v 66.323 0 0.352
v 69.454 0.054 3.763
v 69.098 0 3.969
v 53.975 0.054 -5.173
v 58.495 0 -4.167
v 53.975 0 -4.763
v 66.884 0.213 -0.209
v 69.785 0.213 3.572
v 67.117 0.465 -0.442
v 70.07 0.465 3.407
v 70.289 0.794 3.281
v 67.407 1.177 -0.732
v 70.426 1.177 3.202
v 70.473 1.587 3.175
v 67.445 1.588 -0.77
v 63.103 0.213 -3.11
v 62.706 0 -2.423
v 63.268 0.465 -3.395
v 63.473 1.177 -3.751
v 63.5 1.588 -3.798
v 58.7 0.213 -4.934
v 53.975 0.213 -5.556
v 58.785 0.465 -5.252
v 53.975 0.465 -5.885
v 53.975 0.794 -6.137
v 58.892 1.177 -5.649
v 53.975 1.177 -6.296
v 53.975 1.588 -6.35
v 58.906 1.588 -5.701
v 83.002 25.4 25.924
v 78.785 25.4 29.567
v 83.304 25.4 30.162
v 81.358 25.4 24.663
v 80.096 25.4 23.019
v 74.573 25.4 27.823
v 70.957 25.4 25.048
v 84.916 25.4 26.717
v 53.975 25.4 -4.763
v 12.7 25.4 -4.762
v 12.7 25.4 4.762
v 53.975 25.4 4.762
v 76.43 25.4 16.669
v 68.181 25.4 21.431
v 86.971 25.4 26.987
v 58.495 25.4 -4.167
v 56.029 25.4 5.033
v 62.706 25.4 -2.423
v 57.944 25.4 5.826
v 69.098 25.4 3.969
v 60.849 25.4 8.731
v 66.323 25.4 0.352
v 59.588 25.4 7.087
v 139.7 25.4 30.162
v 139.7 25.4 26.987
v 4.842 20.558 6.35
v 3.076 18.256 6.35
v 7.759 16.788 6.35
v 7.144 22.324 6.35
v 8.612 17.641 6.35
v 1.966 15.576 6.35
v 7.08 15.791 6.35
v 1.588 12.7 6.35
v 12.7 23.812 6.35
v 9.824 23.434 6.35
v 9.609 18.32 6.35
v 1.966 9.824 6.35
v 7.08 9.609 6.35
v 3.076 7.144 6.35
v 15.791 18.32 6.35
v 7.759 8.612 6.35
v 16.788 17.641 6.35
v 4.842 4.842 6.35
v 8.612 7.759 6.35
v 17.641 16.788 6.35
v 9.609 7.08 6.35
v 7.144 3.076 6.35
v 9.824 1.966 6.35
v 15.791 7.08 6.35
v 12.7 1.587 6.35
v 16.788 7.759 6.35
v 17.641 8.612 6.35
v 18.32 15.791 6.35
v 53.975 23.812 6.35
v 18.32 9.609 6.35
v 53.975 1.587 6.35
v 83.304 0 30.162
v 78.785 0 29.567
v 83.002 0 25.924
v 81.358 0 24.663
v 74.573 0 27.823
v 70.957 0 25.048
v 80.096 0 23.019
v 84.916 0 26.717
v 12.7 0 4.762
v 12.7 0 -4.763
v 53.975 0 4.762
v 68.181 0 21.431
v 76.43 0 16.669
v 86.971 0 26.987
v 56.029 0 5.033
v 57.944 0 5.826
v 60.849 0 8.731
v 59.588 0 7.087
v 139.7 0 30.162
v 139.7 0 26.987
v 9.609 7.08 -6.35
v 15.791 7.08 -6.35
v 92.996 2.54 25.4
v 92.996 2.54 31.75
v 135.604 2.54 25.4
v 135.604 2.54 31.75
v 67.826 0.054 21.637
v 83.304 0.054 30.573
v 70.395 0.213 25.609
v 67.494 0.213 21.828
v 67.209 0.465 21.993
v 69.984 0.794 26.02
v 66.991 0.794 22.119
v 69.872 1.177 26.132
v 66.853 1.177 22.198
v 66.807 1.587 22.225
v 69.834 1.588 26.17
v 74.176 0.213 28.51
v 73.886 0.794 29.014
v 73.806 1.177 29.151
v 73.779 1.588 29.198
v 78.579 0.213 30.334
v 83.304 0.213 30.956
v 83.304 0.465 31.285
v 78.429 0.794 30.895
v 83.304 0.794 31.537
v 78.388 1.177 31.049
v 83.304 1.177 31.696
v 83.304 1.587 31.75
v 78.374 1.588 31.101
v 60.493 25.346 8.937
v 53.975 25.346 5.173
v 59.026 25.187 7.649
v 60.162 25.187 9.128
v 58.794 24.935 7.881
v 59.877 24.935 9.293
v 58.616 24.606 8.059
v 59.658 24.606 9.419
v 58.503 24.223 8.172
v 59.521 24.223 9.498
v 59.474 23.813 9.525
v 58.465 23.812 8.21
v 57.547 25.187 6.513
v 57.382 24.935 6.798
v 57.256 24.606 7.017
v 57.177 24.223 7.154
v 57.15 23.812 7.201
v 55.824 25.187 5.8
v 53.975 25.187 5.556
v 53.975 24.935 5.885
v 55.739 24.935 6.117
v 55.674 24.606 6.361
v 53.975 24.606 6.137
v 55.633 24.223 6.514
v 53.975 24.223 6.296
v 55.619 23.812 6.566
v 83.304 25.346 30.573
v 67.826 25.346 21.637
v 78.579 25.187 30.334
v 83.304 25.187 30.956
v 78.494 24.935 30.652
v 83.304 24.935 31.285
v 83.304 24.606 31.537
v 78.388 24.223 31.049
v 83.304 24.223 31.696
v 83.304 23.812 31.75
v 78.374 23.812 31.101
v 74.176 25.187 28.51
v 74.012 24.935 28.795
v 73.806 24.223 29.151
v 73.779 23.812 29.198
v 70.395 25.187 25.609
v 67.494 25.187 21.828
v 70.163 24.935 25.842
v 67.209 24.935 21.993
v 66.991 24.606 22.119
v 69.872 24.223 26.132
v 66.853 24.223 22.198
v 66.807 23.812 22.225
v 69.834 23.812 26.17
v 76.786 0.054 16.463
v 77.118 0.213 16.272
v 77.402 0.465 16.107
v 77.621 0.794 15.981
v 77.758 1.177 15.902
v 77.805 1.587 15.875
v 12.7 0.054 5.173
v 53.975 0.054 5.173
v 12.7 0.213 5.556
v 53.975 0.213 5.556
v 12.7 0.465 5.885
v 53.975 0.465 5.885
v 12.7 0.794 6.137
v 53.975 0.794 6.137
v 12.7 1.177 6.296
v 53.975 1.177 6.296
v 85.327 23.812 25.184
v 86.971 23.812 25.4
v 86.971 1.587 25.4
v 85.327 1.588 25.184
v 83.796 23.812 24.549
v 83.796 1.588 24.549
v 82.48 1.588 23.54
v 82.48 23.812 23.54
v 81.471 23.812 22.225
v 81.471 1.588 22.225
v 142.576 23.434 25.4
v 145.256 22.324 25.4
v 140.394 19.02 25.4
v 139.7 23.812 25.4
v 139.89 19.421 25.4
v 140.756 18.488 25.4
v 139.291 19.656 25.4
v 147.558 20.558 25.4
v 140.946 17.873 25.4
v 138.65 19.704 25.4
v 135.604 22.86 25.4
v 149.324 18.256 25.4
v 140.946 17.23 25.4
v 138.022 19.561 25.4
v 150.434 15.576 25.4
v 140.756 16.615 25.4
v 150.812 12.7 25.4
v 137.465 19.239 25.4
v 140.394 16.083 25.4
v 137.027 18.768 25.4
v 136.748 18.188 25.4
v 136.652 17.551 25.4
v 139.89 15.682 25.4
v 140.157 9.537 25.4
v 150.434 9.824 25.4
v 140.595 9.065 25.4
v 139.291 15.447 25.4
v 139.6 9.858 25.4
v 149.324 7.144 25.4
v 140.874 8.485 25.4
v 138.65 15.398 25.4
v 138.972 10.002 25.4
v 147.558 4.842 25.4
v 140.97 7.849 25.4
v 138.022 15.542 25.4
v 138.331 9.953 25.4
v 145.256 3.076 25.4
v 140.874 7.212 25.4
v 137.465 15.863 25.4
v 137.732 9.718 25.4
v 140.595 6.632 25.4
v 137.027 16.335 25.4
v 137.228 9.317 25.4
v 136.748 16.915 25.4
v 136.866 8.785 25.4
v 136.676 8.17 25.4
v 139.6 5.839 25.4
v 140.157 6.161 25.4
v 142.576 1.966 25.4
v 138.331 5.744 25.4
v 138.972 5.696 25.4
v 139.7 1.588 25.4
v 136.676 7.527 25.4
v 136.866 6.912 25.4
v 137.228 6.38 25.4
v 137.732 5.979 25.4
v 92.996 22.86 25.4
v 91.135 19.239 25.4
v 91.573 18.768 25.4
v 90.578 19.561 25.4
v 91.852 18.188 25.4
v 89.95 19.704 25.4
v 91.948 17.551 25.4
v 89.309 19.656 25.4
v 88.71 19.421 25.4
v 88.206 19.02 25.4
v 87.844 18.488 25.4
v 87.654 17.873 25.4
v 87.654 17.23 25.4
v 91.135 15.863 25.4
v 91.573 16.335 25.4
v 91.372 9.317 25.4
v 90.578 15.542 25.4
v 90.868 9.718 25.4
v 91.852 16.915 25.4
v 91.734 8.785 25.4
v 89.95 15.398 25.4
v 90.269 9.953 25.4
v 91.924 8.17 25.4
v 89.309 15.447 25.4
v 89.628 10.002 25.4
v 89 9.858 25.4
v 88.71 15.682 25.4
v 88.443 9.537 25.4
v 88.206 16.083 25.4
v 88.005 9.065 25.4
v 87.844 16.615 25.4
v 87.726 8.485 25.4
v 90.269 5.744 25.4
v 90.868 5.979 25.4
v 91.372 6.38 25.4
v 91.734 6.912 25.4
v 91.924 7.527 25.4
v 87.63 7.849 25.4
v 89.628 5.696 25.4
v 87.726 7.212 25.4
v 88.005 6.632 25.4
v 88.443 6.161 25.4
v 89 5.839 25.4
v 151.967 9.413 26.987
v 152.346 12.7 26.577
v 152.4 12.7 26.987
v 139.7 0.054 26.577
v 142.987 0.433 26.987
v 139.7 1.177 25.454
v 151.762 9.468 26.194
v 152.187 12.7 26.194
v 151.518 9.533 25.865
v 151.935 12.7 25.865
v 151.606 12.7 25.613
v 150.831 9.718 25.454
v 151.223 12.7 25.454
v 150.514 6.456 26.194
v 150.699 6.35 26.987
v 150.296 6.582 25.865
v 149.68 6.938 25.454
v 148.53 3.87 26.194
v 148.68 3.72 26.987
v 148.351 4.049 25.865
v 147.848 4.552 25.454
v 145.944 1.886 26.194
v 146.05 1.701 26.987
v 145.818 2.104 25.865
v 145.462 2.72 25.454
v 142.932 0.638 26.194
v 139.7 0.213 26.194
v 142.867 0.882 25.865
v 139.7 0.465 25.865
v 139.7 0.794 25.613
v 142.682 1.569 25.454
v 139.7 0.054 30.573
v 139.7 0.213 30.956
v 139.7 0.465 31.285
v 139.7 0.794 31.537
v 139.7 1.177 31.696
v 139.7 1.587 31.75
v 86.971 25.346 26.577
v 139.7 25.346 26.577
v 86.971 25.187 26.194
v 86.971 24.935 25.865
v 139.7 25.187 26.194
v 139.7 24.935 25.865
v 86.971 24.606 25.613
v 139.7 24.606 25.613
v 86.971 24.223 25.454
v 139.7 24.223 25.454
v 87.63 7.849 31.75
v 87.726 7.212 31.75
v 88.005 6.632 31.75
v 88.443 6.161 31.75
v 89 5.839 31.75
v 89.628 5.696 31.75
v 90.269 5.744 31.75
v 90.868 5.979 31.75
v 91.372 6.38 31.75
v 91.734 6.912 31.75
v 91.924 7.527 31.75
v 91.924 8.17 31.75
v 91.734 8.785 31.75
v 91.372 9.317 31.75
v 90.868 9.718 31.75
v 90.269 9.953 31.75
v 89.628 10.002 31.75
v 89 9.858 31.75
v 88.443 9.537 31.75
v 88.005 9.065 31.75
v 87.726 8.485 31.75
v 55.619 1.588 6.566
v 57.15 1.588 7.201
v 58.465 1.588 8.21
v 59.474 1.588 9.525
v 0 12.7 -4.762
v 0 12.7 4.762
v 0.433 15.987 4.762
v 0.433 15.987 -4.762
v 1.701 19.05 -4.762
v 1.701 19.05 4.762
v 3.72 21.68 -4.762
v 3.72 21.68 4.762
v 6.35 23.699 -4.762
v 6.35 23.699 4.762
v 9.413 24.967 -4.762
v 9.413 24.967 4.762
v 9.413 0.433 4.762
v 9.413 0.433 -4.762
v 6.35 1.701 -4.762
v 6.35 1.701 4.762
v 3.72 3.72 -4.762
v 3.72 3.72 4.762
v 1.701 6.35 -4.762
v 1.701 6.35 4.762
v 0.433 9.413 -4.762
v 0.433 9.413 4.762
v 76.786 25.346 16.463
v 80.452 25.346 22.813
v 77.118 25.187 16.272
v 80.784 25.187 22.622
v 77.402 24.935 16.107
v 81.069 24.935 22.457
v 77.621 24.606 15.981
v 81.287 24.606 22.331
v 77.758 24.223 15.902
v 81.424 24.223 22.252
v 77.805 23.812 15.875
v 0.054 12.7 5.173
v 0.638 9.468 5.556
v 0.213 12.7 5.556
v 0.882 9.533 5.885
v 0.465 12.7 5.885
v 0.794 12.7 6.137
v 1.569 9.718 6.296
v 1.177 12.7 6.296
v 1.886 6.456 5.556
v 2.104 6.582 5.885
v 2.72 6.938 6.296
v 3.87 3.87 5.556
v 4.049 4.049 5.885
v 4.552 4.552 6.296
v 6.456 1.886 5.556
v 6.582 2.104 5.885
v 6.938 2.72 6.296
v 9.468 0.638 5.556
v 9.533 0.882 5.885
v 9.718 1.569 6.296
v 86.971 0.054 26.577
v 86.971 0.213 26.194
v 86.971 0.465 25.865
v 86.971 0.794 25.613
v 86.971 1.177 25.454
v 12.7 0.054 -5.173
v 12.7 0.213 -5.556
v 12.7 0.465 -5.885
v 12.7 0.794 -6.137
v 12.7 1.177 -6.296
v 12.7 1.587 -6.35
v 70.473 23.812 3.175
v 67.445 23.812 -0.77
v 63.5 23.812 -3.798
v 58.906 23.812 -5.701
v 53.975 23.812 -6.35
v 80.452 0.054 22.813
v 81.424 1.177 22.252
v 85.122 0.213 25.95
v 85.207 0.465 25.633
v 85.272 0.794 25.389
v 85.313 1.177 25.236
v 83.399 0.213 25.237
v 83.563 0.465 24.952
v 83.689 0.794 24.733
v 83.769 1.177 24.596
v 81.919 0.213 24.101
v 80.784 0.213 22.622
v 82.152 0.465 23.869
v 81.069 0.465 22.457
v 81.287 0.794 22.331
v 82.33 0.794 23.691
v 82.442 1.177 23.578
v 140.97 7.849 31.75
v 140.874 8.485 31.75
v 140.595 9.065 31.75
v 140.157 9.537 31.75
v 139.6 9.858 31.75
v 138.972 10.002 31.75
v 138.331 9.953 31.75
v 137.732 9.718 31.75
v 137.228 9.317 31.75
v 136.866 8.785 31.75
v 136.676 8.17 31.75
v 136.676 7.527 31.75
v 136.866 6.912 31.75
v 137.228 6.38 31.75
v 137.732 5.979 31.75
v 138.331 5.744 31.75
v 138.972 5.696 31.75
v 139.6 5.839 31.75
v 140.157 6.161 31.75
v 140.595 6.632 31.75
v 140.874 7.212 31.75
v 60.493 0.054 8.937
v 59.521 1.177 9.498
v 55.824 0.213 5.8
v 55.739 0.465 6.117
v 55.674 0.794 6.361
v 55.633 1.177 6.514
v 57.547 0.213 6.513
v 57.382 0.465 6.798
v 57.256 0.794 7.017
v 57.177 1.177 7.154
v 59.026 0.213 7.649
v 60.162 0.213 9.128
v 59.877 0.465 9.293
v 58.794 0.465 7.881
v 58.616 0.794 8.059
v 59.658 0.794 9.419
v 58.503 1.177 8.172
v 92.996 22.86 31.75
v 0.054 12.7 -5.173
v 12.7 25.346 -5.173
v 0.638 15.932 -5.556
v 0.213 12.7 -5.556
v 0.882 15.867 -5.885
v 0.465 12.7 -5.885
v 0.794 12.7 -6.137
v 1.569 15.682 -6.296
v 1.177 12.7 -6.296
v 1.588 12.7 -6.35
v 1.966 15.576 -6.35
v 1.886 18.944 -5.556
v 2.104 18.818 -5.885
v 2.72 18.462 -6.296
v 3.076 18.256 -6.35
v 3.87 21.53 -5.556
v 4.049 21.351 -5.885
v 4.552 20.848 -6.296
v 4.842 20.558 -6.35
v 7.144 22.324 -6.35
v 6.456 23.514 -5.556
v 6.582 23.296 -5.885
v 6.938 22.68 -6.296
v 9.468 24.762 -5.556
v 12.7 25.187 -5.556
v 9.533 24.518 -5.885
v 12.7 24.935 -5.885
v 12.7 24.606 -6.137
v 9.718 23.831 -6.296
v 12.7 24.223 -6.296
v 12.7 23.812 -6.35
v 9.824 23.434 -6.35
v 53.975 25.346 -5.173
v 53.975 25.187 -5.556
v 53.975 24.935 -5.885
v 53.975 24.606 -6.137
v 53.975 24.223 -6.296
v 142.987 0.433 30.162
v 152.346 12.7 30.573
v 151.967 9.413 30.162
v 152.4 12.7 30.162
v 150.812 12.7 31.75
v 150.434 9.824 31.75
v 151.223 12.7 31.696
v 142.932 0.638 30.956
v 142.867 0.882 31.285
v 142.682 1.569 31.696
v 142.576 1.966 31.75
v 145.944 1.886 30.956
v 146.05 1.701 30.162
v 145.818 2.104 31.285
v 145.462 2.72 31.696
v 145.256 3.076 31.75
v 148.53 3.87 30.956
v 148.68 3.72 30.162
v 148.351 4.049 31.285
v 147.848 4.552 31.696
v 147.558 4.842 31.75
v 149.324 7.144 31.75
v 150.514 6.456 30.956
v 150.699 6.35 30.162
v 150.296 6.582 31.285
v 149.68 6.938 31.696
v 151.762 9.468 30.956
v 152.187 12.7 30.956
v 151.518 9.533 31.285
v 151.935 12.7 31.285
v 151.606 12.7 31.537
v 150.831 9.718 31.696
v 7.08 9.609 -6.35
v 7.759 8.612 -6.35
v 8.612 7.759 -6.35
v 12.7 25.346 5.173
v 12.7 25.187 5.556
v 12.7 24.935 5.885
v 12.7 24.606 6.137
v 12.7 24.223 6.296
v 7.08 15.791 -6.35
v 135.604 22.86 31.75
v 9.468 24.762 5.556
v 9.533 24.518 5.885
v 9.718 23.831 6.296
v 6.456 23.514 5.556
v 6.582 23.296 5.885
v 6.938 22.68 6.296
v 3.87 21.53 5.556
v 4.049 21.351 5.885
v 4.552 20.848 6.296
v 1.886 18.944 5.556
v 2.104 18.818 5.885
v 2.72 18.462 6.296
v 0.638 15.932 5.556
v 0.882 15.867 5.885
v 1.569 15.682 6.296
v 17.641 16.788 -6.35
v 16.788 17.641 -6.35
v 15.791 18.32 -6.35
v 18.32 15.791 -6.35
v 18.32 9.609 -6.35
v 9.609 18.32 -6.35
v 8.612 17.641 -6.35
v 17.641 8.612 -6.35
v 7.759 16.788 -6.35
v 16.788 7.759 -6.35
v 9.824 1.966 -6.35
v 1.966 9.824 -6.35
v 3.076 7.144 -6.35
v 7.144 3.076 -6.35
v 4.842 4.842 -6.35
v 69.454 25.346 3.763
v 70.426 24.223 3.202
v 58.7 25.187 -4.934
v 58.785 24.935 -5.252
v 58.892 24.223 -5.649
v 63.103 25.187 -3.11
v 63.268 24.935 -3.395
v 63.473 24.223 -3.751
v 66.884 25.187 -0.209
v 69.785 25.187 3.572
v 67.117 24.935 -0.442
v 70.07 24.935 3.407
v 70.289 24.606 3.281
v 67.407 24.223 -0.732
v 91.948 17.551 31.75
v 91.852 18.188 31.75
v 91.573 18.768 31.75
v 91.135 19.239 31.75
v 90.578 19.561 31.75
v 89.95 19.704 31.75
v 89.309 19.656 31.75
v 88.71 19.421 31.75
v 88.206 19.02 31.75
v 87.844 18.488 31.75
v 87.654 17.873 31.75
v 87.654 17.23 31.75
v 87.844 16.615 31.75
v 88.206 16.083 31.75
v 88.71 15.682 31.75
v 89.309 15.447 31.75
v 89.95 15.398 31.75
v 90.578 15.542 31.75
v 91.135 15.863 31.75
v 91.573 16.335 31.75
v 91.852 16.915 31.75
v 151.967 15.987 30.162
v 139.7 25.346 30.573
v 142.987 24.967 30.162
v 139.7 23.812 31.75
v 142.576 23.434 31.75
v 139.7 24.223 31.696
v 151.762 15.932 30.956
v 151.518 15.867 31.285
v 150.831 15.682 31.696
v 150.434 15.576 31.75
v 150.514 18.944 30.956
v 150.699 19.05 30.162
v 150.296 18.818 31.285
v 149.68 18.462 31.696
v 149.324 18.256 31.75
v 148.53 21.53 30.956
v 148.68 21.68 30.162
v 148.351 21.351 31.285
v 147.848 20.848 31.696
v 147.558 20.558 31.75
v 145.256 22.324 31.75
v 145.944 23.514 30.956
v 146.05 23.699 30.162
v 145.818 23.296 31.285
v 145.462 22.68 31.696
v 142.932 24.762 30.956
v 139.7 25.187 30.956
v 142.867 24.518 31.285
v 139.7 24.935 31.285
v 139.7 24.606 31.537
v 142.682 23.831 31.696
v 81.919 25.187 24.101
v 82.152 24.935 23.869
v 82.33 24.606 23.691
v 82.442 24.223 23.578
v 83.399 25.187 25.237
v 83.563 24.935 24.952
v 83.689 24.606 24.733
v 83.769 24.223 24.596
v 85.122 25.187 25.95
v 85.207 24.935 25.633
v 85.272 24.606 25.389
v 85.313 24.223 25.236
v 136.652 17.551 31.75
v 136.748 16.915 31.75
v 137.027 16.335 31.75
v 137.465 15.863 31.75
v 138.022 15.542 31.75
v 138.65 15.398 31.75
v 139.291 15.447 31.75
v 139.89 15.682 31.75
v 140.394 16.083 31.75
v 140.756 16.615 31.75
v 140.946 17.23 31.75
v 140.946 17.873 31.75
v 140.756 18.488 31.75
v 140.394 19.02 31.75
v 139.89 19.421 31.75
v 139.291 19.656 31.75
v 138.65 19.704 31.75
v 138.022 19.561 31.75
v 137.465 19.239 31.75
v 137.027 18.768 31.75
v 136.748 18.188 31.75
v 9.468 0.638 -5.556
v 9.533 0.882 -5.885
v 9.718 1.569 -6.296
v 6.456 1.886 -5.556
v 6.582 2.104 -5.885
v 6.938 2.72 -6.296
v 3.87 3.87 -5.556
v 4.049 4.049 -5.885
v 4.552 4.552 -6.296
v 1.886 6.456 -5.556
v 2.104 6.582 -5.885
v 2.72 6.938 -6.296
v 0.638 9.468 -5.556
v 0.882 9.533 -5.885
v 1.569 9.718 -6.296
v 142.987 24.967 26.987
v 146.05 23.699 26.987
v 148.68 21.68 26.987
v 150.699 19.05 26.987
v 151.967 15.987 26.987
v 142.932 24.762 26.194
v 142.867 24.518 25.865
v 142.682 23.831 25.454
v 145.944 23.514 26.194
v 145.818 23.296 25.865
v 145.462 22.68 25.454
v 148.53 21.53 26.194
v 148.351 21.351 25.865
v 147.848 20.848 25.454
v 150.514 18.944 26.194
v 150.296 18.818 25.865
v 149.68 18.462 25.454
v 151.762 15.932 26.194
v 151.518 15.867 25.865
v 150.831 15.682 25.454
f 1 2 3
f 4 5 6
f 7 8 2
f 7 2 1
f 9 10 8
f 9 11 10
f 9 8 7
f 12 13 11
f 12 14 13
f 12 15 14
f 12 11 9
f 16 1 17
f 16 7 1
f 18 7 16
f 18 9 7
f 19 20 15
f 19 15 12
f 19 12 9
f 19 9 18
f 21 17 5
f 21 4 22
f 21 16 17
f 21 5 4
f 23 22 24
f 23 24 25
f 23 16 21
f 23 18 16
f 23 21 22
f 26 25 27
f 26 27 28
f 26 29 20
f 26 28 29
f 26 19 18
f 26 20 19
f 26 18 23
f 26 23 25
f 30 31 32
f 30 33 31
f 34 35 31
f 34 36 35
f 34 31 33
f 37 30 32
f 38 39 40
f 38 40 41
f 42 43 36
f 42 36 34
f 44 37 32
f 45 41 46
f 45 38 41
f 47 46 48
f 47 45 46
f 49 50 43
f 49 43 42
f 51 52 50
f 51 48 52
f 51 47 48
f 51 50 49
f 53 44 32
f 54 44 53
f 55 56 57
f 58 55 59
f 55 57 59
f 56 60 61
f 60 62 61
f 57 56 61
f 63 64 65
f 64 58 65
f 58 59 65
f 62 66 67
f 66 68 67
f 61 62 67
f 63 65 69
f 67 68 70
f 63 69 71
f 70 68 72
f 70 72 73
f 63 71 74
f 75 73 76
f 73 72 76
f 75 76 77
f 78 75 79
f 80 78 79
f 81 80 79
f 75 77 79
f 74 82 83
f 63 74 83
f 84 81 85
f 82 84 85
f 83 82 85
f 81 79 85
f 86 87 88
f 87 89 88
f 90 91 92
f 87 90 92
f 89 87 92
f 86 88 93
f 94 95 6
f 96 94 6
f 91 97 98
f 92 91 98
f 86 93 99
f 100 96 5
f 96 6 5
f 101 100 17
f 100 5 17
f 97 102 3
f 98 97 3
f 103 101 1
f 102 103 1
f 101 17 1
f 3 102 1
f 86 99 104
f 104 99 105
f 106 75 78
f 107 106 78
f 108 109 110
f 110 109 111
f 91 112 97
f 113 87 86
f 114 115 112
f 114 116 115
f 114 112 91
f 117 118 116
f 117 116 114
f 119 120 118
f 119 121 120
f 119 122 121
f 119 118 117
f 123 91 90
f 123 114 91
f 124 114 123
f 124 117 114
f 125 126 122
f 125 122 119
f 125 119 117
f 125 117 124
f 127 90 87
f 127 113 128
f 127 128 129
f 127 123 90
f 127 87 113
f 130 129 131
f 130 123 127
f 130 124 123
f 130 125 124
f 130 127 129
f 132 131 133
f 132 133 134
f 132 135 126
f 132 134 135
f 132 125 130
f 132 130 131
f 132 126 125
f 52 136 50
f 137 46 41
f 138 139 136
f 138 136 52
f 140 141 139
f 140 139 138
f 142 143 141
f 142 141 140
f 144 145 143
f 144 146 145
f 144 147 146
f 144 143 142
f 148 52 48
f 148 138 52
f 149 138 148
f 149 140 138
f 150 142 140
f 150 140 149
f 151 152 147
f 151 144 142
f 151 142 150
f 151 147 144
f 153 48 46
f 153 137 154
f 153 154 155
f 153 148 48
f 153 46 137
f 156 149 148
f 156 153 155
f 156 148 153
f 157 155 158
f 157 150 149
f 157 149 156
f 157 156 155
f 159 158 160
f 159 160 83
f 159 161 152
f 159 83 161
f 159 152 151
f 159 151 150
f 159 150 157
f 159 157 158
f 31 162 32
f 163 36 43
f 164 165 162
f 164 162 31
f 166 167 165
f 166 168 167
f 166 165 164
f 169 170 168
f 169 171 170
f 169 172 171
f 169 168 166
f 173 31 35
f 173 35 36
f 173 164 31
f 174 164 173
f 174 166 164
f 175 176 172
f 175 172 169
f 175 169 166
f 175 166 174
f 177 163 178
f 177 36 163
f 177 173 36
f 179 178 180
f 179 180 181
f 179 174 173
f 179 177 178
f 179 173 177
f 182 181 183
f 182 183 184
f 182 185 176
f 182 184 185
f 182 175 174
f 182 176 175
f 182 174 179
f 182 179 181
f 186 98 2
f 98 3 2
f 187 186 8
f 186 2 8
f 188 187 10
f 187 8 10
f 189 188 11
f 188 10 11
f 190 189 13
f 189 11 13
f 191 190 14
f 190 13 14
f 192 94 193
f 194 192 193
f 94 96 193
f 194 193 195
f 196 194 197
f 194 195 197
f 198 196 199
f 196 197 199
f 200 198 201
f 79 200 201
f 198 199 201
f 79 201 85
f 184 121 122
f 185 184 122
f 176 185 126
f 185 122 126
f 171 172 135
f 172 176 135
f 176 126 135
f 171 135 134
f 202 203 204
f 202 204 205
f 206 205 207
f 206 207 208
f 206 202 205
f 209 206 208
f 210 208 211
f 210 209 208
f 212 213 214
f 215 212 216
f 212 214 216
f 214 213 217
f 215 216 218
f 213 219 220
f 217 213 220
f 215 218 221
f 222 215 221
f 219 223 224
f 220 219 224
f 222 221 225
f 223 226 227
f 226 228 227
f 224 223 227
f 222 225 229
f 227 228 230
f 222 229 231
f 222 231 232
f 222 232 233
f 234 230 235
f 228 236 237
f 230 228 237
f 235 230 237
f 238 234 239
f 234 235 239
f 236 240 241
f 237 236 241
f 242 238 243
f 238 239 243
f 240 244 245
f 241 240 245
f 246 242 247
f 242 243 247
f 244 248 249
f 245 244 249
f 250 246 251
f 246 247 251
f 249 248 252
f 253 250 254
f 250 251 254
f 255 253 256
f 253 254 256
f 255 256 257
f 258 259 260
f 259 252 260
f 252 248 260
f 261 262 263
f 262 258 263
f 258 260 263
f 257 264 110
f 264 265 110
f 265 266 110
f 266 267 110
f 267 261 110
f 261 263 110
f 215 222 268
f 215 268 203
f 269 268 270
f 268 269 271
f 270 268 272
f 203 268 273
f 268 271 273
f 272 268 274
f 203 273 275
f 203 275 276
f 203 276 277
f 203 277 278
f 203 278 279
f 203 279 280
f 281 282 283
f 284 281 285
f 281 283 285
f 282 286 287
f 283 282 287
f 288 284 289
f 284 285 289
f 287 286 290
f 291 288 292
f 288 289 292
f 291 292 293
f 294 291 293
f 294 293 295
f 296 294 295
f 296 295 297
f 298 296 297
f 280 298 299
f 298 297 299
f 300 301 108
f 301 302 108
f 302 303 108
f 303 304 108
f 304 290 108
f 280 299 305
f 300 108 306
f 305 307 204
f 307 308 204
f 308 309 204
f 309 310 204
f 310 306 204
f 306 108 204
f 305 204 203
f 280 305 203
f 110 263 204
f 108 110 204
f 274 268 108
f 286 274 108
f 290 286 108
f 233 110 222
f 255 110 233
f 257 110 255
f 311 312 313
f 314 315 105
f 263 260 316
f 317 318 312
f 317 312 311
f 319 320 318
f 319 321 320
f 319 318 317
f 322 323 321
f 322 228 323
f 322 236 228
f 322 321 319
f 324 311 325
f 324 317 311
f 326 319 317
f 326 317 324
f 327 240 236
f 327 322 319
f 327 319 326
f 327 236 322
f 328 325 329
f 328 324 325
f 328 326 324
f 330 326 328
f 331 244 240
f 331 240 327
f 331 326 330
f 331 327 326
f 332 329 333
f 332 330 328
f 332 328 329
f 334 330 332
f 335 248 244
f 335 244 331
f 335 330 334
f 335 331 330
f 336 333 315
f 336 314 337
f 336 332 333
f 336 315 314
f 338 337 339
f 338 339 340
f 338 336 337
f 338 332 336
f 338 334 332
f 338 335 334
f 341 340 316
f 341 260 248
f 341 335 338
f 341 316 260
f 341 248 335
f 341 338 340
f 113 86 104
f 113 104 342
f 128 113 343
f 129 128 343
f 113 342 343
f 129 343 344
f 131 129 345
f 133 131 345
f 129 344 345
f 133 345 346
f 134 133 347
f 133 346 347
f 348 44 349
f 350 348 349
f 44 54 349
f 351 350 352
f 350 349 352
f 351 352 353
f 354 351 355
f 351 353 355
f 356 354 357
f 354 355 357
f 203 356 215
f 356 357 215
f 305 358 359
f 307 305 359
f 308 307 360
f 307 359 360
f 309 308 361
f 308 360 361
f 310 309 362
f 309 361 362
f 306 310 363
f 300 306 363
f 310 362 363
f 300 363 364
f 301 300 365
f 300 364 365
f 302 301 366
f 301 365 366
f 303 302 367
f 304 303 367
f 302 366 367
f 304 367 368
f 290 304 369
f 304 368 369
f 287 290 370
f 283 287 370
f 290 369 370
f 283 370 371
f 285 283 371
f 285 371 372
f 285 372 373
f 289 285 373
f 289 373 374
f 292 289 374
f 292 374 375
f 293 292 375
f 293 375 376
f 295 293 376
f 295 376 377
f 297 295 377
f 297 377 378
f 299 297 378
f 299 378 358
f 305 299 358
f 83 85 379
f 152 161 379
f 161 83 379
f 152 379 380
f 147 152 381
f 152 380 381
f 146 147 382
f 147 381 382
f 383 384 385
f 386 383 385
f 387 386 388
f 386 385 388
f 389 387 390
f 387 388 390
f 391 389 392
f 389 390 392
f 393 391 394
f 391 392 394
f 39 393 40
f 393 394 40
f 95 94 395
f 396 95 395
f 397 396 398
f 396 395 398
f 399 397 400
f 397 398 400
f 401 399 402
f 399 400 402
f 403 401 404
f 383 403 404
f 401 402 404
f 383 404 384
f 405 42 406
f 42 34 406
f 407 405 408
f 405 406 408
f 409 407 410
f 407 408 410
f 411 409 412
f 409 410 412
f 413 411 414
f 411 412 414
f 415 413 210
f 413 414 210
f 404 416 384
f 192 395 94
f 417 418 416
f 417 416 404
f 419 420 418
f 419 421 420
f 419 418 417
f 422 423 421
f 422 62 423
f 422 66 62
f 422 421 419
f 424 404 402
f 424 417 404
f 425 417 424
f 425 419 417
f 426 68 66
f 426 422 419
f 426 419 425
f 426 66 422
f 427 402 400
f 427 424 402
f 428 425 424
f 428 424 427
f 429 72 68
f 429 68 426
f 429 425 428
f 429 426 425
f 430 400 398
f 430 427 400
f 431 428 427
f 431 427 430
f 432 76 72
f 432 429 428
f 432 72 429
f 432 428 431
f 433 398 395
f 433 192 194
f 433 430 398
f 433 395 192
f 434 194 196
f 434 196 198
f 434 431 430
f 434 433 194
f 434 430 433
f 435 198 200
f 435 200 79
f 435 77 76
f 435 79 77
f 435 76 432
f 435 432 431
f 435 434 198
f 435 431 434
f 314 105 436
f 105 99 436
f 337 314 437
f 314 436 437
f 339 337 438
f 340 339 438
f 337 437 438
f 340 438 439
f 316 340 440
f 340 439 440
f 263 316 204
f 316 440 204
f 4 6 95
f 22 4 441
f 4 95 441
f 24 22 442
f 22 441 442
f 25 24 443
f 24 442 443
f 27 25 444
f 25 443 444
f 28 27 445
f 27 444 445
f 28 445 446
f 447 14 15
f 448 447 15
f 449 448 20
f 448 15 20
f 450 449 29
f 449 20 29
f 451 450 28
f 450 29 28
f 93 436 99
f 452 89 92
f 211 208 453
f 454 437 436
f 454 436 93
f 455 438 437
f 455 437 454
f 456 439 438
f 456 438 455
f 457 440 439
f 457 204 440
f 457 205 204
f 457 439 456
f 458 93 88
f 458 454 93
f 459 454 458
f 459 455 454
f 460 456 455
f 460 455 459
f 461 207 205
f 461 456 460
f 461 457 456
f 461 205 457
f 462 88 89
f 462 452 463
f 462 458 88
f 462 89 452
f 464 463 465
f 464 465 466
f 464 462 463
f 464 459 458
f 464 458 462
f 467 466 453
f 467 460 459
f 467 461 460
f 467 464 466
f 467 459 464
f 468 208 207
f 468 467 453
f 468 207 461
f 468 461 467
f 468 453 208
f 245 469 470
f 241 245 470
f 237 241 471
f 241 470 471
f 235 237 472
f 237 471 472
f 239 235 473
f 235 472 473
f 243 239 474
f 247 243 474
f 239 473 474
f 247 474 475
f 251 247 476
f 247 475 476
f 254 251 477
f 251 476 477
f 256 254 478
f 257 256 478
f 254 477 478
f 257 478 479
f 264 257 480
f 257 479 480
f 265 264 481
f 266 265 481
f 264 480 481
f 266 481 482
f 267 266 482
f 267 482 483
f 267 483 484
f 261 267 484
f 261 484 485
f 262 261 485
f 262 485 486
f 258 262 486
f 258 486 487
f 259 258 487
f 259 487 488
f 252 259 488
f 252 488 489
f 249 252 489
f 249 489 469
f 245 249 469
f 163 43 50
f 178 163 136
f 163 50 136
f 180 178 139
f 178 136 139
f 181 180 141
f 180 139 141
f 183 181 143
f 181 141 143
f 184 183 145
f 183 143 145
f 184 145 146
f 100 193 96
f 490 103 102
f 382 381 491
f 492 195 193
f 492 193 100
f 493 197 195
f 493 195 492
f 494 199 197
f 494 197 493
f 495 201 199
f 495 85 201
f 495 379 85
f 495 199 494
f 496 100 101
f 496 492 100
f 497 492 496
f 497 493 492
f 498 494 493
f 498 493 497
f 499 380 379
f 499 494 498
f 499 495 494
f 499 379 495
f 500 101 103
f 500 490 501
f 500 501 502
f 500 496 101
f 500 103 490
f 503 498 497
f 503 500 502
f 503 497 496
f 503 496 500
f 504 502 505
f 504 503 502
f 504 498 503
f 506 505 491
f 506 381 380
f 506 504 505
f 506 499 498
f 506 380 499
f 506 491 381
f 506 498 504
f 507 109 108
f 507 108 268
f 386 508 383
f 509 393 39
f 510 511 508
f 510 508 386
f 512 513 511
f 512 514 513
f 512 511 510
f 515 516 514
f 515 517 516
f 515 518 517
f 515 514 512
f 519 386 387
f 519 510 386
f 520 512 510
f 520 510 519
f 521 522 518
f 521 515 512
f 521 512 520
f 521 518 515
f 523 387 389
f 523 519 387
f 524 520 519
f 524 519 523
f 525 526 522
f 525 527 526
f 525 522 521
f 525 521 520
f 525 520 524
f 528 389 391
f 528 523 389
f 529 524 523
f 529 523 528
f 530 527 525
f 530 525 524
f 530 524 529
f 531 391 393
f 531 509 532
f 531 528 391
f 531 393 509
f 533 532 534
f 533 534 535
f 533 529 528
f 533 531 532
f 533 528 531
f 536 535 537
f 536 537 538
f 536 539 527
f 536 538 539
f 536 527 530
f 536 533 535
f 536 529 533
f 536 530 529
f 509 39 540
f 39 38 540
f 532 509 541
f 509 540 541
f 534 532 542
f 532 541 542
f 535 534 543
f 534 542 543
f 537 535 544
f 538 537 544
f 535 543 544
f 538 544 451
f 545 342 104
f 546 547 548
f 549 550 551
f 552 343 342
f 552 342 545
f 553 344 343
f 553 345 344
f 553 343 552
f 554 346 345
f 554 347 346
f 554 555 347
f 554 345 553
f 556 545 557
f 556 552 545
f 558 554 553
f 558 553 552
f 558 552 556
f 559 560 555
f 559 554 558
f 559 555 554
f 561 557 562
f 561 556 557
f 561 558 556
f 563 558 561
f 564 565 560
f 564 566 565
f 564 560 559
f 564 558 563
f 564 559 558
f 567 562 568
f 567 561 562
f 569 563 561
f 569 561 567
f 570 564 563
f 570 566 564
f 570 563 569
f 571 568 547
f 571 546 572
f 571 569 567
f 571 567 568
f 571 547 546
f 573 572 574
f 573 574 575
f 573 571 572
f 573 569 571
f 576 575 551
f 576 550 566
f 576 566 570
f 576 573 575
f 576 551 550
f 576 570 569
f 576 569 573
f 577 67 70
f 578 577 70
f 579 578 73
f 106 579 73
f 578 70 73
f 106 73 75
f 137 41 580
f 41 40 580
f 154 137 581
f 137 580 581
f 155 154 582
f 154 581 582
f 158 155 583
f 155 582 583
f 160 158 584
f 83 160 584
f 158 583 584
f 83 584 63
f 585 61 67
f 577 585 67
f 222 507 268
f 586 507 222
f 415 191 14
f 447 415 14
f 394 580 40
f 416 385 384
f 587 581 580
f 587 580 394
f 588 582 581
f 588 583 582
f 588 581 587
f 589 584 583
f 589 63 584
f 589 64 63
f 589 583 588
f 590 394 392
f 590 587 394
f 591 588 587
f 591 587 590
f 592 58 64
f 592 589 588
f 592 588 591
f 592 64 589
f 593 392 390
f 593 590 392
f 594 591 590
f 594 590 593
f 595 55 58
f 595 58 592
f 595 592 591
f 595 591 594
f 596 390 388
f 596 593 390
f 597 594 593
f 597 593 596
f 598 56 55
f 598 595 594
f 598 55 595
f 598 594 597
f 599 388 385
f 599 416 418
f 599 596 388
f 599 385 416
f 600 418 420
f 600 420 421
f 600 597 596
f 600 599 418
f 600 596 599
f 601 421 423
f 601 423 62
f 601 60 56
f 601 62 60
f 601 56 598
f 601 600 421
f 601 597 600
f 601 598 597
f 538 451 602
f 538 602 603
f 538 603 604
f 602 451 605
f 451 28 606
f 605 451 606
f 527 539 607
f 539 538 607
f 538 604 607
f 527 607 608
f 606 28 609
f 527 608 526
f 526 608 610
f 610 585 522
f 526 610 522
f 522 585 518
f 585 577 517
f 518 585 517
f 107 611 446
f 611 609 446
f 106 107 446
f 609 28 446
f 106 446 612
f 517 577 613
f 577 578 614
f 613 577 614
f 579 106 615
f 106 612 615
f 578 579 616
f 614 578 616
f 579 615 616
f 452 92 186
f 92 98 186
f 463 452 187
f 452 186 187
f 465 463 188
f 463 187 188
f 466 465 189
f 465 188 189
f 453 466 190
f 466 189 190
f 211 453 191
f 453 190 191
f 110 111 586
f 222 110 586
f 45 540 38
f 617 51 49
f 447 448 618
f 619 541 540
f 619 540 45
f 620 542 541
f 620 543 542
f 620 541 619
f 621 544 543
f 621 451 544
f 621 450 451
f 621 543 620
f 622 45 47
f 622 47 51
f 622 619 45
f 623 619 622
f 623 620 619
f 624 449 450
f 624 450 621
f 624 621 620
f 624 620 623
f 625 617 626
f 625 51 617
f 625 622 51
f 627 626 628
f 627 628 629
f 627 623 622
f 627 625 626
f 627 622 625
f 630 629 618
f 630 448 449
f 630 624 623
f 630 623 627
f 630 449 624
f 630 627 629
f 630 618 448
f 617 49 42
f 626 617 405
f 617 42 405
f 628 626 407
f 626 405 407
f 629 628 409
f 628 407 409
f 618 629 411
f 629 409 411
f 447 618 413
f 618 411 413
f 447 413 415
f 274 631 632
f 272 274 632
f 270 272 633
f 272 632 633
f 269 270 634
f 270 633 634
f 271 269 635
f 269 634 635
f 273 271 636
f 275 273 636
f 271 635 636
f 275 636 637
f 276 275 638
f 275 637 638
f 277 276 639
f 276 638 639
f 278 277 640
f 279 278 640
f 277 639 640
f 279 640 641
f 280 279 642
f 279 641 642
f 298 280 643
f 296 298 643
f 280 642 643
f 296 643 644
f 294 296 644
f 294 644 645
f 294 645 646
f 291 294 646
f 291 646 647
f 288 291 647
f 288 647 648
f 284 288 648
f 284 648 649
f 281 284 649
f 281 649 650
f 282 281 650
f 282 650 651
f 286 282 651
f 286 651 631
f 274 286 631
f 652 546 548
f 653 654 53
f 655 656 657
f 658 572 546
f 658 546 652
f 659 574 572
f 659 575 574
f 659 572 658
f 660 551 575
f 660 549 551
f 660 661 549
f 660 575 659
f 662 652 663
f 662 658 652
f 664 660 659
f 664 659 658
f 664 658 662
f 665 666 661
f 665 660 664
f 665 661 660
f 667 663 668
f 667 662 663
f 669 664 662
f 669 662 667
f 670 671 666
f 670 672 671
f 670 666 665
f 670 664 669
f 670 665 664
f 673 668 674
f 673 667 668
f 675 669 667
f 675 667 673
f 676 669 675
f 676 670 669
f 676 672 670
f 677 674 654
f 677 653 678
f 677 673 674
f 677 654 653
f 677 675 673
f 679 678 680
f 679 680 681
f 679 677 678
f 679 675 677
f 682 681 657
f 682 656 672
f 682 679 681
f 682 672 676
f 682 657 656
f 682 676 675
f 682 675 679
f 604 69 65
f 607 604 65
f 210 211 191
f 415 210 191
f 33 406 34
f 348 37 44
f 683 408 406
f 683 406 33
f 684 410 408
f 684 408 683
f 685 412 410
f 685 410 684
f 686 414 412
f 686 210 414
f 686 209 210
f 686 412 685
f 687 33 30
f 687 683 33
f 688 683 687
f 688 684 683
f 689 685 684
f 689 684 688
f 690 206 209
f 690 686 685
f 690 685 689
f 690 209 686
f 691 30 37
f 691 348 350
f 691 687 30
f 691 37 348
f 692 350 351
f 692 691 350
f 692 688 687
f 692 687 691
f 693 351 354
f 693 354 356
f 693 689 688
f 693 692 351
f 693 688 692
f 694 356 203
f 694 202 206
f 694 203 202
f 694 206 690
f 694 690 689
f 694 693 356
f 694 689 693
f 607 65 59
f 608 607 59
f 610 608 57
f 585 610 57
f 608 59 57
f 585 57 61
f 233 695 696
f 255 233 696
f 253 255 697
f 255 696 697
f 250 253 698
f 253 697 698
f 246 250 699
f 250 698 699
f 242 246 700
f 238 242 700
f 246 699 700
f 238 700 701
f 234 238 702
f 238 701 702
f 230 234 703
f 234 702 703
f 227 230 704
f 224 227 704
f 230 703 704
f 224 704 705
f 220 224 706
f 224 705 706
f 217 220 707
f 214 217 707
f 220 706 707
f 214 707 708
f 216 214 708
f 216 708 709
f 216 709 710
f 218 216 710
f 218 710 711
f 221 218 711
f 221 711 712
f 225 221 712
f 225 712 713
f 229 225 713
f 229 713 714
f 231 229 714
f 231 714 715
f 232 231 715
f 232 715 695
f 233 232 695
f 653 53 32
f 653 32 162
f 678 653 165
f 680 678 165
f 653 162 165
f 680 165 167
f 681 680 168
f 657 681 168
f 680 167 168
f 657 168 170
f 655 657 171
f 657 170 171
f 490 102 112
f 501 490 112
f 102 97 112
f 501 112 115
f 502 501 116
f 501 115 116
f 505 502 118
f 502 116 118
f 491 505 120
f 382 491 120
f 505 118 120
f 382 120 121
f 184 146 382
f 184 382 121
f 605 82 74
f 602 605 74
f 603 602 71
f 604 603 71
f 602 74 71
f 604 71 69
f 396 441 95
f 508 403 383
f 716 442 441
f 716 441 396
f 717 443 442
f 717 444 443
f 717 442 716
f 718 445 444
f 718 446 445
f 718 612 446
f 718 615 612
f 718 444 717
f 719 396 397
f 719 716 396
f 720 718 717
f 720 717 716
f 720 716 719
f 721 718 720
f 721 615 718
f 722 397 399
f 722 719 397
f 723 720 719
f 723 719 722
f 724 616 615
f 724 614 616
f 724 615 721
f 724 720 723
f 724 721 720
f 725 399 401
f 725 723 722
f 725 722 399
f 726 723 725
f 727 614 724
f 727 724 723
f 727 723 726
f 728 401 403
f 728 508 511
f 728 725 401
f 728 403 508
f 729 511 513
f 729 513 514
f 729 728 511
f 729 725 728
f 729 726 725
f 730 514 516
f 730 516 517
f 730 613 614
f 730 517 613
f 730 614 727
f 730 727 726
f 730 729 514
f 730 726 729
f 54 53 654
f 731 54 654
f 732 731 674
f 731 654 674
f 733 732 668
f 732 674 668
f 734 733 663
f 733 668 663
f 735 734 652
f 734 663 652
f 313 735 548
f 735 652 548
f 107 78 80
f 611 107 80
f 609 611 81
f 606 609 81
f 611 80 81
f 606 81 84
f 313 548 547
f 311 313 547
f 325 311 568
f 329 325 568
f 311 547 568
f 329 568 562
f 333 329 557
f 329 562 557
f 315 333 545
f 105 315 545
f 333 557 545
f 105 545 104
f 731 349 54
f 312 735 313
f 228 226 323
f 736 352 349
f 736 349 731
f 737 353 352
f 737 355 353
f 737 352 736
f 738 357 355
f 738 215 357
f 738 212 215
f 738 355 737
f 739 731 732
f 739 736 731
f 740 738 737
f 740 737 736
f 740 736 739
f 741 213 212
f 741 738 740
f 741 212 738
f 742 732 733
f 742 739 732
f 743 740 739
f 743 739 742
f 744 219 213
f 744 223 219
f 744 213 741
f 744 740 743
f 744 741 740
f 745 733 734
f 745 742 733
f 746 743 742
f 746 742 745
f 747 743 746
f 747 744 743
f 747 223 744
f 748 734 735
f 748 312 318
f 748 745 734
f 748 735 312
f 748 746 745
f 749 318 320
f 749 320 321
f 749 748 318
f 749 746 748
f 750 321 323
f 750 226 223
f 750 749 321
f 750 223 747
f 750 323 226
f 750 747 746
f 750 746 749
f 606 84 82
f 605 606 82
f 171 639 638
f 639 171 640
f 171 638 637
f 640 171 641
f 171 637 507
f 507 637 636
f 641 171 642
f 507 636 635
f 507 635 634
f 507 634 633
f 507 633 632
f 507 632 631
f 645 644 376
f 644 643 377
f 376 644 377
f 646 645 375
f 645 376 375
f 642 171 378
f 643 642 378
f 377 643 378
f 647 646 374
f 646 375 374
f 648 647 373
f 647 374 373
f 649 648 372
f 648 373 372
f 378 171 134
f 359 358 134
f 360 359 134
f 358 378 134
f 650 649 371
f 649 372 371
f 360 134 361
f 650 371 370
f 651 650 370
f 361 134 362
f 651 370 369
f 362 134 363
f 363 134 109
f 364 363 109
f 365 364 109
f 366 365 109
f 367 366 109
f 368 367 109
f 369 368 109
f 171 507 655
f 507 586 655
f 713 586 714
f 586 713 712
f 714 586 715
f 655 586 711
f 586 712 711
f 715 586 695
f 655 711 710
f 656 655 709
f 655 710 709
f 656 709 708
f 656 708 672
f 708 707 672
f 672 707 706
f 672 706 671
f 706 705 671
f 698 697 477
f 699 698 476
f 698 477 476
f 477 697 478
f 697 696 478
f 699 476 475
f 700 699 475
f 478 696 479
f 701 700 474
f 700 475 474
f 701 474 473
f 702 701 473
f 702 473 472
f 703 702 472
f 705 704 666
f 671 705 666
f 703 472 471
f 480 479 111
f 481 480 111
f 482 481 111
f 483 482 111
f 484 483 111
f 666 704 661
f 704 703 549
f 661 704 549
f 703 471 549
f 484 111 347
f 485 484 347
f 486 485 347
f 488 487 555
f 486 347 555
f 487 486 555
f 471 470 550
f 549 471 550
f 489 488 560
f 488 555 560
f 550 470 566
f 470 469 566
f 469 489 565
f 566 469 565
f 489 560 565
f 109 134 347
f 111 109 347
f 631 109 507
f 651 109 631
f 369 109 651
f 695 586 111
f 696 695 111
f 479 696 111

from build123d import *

# Parameters (mm, degrees)
BOSS_EXTRUDE1_DEPTH = 25.4
CUT_EXTRUDE1_DEPTH  = 25.4
CUT_EXTRUDE2_REACH  = 158.576
CUT_EXTRUDE6_REACH  = 161.131
CUT_EXTRUDE7_REACH  = 161.131
SKETCH8_R           = 2.159
SKETCH8_W           = 42.6085
SKETCH8_H           = 20.32
FILLET2_R           = 6.35
FILLET1_R           = 1.5875


with BuildPart() as part:
    # Sketch1 → Boss-Extrude1 (new body)
    with BuildSketch(Plane(origin=(0, 0, 0), x_dir=(1, 0, 0), z_dir=(0, 1, 0))):
        with BuildLine():
            Line((152.4, -25.4), (83.304393675, -25.4))
            Line((83.304393675, -25.4), (77.805132361, -15.875))
            Line((77.805132361, -15.875), (70.472783942, -3.175))
            ThreePointArc((70.472783942, -3.175), (63.5, 3.797783942), (53.975, 6.35))
            Line((53.975, 6.35), (0, 6.35))
            Line((0, 6.35), (0, -6.35))
            Line((0, -6.35), (53.975, -6.35))
            ThreePointArc((53.975, -6.35), (57.15, -7.200738686), (59.474261314, -9.525))
            Line((59.474261314, -9.525), (66.806609733, -22.225))
            ThreePointArc((66.806609733, -22.225), (73.779393675, -29.197783942), (83.304393675, -31.75))
            Line((83.304393675, -31.75), (152.4, -31.75))
            Line((152.4, -31.75), (152.4, -25.4))
        make_face()
    extrude(amount=BOSS_EXTRUDE1_DEPTH)

    # Sketch3 → Cut-Extrude1 (cut)
    with BuildSketch(Plane.XY.offset(6.35)):
        with BuildLine():
            ThreePointArc((7.08025, 9.609467329), (8.164970659, 8.164970659), (9.609467329, 7.08025))
            Line((9.609467329, 7.08025), (15.790532671, 7.08025))
            ThreePointArc((15.790532671, 7.08025), (17.235029341, 8.164970659), (18.31975, 9.609467329))
            Line((18.31975, 9.609467329), (18.31975, 15.790532671))
            ThreePointArc((18.31975, 15.790532671), (17.235029341, 17.235029341), (15.790532671, 18.31975))
            Line((15.790532671, 18.31975), (9.609467329, 18.31975))
            ThreePointArc((9.609467329, 18.31975), (8.164970659, 17.235029341), (7.08025, 15.790532671))
            Line((7.08025, 15.790532671), (7.08025, 9.609467329))
        make_face()
    extrude(amount=-CUT_EXTRUDE1_DEPTH, mode=Mode.SUBTRACT)

    # Sketch4 → Cut-Extrude2 (cut, up to next)
    with BuildSketch(Plane.XY.offset(6.35), mode=Mode.PRIVATE) as cut_extrude2_sk1:
        with BuildLine():
            Line((0, 12.7), (0, 0))
            Line((0, 0), (12.7, 0))
            ThreePointArc((12.7, 0), (3.719743879, 3.719743879), (0, 12.7))
        make_face()
    cut_extrude2_tool1 = extrude(cut_extrude2_sk1.sketch, amount=-CUT_EXTRUDE2_REACH, mode=Mode.PRIVATE) & part.part
    # Sketch4 → Cut-Extrude2 (cut, up to next)
    with BuildSketch(Plane.XY.offset(6.35), mode=Mode.PRIVATE) as cut_extrude2_sk2:
        with BuildLine():
            Line((0, 25.4), (0, 12.7))
            ThreePointArc((0, 12.7), (3.719743879, 21.680256121), (12.7, 25.4))
            Line((12.7, 25.4), (0, 25.4))
        make_face()
    cut_extrude2_tool2 = extrude(cut_extrude2_sk2.sketch, amount=-CUT_EXTRUDE2_REACH, mode=Mode.PRIVATE) & part.part
    add(cut_extrude2_tool1.solids().sort_by_distance((2.836773, 2.836773, 6.35))[0], mode=Mode.SUBTRACT)
    add(cut_extrude2_tool2.solids().sort_by_distance((2.836773, 22.563227, 6.35))[0], mode=Mode.SUBTRACT)

    # Sketch7 → Cut-Extrude6 (cut, up to next)
    with BuildSketch(Plane.XY.offset(31.75), mode=Mode.PRIVATE) as cut_extrude6_sk1:
        with BuildLine():
            ThreePointArc((139.7, 25.4), (148.680256121, 21.680256121), (152.4, 12.7))
            Line((152.4, 12.7), (152.4, 25.4))
            Line((152.4, 25.4), (139.7, 25.4))
        make_face()
    cut_extrude6_tool1 = extrude(cut_extrude6_sk1.sketch, amount=-CUT_EXTRUDE6_REACH, mode=Mode.PRIVATE) & part.part
    # Sketch7 → Cut-Extrude6 (cut, up to next)
    with BuildSketch(Plane.XY.offset(31.75), mode=Mode.PRIVATE) as cut_extrude6_sk2:
        with BuildLine():
            ThreePointArc((152.4, 12.7), (148.680256121, 3.719743879), (139.7, 0))
            Line((139.7, 0), (152.4, 0))
            Line((152.4, 0), (152.4, 12.7))
        make_face()
    cut_extrude6_tool2 = extrude(cut_extrude6_sk2.sketch, amount=-CUT_EXTRUDE6_REACH, mode=Mode.PRIVATE) & part.part
    add(cut_extrude6_tool1.solids().sort_by_distance((149.563227, 22.563227, 31.75))[0], mode=Mode.SUBTRACT)
    add(cut_extrude6_tool2.solids().sort_by_distance((149.563227, 2.836773, 31.75))[0], mode=Mode.SUBTRACT)

    # Sketch8 → Cut-Extrude7 (cut, up to next)
    with BuildSketch(Plane.XY.offset(31.75), mode=Mode.PRIVATE) as cut_extrude7_sk1:
        with Locations((138.811, 7.8486)):
            Circle(SKETCH8_R)
    cut_extrude7_tool1 = extrude(cut_extrude7_sk1.sketch, amount=-CUT_EXTRUDE7_REACH, mode=Mode.PRIVATE) & part.part
    # Sketch8 → Cut-Extrude7 (cut, up to next)
    with BuildSketch(Plane.XY.offset(31.75), mode=Mode.PRIVATE) as cut_extrude7_sk2:
        with Locations(Location((138.811, 17.5514, 0), (0, 0, 180))):
            Circle(SKETCH8_R)
    cut_extrude7_tool2 = extrude(cut_extrude7_sk2.sketch, amount=-CUT_EXTRUDE7_REACH, mode=Mode.PRIVATE) & part.part
    # Sketch8 → Cut-Extrude7 (cut, up to next)
    with BuildSketch(Plane.XY.offset(31.75), mode=Mode.PRIVATE) as cut_extrude7_sk3:
        with Locations(Location((89.789, 7.8486, 0), (0, 0, 180))):
            Circle(SKETCH8_R)
    cut_extrude7_tool3 = extrude(cut_extrude7_sk3.sketch, amount=-CUT_EXTRUDE7_REACH, mode=Mode.PRIVATE) & part.part
    # Sketch8 → Cut-Extrude7 (cut, up to next)
    with BuildSketch(Plane.XY.offset(31.75), mode=Mode.PRIVATE) as cut_extrude7_sk4:
        with Locations((89.789, 17.5514)):
            Circle(SKETCH8_R)
    cut_extrude7_tool4 = extrude(cut_extrude7_sk4.sketch, amount=-CUT_EXTRUDE7_REACH, mode=Mode.PRIVATE) & part.part
    # Sketch8 → Cut-Extrude7 (cut, up to next)
    with BuildSketch(Plane.XY.offset(31.75), mode=Mode.PRIVATE) as cut_extrude7_sk5:
        with Locations((114.3, 12.7)):
            Rectangle(SKETCH8_W, SKETCH8_H)
    cut_extrude7_tool5 = extrude(cut_extrude7_sk5.sketch, amount=-CUT_EXTRUDE7_REACH, mode=Mode.PRIVATE) & part.part
    add(cut_extrude7_tool1.solids().sort_by_distance((138.811, 7.8486, 31.75))[0], mode=Mode.SUBTRACT)
    add(cut_extrude7_tool2.solids().sort_by_distance((138.811, 17.5514, 31.75))[0], mode=Mode.SUBTRACT)
    add(cut_extrude7_tool3.solids().sort_by_distance((89.789, 7.8486, 31.75))[0], mode=Mode.SUBTRACT)
    add(cut_extrude7_tool4.solids().sort_by_distance((89.789, 17.5514, 31.75))[0], mode=Mode.SUBTRACT)
    add(cut_extrude7_tool5.solids().sort_by_distance((114.3, 12.7, 31.75))[0], mode=Mode.SUBTRACT)

    # Fillet2
    fillet2_edges = [part.edges().sort_by_distance(p)[0] for p in [
        (83.304393675, 12.7, 25.4),
    ]]
    fillet(fillet2_edges, radius=FILLET2_R)

    # Fillet1
    fillet1_edges = [part.edges().sort_by_distance(p)[0] for p in [
        (75.972045256, 0, 12.7),
        (111.502196837, 0, 31.75),
        (113.335283942, 25.4, 25.4),
        (113.335283942, 0, 25.4),
        (83.795567884, 0, 24.549261314),
        (83.795567884, 25.4, 24.549261314),
        (73.779393675, 0, 29.197783942),
        (63.140435523, 0, 15.875),
        (57.15, 0, 7.200738686),
        (63.5, 0, -3.797783942),
        (57.15, 25.4, 7.200738686),
        (63.140435523, 25.4, 15.875),
        (73.779393675, 25.4, 29.197783942),
        (111.502196837, 25.4, 31.75),
        (75.972045256, 25.4, 12.7),
        (63.5, 25.4, -3.797783942),
        (33.3375, 25.4, -6.35),
        (33.3375, 25.4, 6.35),
        (0, 12.7, 6.35),
        (0, 12.7, -6.35),
        (33.3375, 0, 6.35),
        (33.3375, 0, -6.35),
        (152.4, 12.7, 31.75),
        (152.4, 12.7, 25.4),
    ]]
    fillet(fillet1_edges, radius=FILLET1_R)


solid = part.part
